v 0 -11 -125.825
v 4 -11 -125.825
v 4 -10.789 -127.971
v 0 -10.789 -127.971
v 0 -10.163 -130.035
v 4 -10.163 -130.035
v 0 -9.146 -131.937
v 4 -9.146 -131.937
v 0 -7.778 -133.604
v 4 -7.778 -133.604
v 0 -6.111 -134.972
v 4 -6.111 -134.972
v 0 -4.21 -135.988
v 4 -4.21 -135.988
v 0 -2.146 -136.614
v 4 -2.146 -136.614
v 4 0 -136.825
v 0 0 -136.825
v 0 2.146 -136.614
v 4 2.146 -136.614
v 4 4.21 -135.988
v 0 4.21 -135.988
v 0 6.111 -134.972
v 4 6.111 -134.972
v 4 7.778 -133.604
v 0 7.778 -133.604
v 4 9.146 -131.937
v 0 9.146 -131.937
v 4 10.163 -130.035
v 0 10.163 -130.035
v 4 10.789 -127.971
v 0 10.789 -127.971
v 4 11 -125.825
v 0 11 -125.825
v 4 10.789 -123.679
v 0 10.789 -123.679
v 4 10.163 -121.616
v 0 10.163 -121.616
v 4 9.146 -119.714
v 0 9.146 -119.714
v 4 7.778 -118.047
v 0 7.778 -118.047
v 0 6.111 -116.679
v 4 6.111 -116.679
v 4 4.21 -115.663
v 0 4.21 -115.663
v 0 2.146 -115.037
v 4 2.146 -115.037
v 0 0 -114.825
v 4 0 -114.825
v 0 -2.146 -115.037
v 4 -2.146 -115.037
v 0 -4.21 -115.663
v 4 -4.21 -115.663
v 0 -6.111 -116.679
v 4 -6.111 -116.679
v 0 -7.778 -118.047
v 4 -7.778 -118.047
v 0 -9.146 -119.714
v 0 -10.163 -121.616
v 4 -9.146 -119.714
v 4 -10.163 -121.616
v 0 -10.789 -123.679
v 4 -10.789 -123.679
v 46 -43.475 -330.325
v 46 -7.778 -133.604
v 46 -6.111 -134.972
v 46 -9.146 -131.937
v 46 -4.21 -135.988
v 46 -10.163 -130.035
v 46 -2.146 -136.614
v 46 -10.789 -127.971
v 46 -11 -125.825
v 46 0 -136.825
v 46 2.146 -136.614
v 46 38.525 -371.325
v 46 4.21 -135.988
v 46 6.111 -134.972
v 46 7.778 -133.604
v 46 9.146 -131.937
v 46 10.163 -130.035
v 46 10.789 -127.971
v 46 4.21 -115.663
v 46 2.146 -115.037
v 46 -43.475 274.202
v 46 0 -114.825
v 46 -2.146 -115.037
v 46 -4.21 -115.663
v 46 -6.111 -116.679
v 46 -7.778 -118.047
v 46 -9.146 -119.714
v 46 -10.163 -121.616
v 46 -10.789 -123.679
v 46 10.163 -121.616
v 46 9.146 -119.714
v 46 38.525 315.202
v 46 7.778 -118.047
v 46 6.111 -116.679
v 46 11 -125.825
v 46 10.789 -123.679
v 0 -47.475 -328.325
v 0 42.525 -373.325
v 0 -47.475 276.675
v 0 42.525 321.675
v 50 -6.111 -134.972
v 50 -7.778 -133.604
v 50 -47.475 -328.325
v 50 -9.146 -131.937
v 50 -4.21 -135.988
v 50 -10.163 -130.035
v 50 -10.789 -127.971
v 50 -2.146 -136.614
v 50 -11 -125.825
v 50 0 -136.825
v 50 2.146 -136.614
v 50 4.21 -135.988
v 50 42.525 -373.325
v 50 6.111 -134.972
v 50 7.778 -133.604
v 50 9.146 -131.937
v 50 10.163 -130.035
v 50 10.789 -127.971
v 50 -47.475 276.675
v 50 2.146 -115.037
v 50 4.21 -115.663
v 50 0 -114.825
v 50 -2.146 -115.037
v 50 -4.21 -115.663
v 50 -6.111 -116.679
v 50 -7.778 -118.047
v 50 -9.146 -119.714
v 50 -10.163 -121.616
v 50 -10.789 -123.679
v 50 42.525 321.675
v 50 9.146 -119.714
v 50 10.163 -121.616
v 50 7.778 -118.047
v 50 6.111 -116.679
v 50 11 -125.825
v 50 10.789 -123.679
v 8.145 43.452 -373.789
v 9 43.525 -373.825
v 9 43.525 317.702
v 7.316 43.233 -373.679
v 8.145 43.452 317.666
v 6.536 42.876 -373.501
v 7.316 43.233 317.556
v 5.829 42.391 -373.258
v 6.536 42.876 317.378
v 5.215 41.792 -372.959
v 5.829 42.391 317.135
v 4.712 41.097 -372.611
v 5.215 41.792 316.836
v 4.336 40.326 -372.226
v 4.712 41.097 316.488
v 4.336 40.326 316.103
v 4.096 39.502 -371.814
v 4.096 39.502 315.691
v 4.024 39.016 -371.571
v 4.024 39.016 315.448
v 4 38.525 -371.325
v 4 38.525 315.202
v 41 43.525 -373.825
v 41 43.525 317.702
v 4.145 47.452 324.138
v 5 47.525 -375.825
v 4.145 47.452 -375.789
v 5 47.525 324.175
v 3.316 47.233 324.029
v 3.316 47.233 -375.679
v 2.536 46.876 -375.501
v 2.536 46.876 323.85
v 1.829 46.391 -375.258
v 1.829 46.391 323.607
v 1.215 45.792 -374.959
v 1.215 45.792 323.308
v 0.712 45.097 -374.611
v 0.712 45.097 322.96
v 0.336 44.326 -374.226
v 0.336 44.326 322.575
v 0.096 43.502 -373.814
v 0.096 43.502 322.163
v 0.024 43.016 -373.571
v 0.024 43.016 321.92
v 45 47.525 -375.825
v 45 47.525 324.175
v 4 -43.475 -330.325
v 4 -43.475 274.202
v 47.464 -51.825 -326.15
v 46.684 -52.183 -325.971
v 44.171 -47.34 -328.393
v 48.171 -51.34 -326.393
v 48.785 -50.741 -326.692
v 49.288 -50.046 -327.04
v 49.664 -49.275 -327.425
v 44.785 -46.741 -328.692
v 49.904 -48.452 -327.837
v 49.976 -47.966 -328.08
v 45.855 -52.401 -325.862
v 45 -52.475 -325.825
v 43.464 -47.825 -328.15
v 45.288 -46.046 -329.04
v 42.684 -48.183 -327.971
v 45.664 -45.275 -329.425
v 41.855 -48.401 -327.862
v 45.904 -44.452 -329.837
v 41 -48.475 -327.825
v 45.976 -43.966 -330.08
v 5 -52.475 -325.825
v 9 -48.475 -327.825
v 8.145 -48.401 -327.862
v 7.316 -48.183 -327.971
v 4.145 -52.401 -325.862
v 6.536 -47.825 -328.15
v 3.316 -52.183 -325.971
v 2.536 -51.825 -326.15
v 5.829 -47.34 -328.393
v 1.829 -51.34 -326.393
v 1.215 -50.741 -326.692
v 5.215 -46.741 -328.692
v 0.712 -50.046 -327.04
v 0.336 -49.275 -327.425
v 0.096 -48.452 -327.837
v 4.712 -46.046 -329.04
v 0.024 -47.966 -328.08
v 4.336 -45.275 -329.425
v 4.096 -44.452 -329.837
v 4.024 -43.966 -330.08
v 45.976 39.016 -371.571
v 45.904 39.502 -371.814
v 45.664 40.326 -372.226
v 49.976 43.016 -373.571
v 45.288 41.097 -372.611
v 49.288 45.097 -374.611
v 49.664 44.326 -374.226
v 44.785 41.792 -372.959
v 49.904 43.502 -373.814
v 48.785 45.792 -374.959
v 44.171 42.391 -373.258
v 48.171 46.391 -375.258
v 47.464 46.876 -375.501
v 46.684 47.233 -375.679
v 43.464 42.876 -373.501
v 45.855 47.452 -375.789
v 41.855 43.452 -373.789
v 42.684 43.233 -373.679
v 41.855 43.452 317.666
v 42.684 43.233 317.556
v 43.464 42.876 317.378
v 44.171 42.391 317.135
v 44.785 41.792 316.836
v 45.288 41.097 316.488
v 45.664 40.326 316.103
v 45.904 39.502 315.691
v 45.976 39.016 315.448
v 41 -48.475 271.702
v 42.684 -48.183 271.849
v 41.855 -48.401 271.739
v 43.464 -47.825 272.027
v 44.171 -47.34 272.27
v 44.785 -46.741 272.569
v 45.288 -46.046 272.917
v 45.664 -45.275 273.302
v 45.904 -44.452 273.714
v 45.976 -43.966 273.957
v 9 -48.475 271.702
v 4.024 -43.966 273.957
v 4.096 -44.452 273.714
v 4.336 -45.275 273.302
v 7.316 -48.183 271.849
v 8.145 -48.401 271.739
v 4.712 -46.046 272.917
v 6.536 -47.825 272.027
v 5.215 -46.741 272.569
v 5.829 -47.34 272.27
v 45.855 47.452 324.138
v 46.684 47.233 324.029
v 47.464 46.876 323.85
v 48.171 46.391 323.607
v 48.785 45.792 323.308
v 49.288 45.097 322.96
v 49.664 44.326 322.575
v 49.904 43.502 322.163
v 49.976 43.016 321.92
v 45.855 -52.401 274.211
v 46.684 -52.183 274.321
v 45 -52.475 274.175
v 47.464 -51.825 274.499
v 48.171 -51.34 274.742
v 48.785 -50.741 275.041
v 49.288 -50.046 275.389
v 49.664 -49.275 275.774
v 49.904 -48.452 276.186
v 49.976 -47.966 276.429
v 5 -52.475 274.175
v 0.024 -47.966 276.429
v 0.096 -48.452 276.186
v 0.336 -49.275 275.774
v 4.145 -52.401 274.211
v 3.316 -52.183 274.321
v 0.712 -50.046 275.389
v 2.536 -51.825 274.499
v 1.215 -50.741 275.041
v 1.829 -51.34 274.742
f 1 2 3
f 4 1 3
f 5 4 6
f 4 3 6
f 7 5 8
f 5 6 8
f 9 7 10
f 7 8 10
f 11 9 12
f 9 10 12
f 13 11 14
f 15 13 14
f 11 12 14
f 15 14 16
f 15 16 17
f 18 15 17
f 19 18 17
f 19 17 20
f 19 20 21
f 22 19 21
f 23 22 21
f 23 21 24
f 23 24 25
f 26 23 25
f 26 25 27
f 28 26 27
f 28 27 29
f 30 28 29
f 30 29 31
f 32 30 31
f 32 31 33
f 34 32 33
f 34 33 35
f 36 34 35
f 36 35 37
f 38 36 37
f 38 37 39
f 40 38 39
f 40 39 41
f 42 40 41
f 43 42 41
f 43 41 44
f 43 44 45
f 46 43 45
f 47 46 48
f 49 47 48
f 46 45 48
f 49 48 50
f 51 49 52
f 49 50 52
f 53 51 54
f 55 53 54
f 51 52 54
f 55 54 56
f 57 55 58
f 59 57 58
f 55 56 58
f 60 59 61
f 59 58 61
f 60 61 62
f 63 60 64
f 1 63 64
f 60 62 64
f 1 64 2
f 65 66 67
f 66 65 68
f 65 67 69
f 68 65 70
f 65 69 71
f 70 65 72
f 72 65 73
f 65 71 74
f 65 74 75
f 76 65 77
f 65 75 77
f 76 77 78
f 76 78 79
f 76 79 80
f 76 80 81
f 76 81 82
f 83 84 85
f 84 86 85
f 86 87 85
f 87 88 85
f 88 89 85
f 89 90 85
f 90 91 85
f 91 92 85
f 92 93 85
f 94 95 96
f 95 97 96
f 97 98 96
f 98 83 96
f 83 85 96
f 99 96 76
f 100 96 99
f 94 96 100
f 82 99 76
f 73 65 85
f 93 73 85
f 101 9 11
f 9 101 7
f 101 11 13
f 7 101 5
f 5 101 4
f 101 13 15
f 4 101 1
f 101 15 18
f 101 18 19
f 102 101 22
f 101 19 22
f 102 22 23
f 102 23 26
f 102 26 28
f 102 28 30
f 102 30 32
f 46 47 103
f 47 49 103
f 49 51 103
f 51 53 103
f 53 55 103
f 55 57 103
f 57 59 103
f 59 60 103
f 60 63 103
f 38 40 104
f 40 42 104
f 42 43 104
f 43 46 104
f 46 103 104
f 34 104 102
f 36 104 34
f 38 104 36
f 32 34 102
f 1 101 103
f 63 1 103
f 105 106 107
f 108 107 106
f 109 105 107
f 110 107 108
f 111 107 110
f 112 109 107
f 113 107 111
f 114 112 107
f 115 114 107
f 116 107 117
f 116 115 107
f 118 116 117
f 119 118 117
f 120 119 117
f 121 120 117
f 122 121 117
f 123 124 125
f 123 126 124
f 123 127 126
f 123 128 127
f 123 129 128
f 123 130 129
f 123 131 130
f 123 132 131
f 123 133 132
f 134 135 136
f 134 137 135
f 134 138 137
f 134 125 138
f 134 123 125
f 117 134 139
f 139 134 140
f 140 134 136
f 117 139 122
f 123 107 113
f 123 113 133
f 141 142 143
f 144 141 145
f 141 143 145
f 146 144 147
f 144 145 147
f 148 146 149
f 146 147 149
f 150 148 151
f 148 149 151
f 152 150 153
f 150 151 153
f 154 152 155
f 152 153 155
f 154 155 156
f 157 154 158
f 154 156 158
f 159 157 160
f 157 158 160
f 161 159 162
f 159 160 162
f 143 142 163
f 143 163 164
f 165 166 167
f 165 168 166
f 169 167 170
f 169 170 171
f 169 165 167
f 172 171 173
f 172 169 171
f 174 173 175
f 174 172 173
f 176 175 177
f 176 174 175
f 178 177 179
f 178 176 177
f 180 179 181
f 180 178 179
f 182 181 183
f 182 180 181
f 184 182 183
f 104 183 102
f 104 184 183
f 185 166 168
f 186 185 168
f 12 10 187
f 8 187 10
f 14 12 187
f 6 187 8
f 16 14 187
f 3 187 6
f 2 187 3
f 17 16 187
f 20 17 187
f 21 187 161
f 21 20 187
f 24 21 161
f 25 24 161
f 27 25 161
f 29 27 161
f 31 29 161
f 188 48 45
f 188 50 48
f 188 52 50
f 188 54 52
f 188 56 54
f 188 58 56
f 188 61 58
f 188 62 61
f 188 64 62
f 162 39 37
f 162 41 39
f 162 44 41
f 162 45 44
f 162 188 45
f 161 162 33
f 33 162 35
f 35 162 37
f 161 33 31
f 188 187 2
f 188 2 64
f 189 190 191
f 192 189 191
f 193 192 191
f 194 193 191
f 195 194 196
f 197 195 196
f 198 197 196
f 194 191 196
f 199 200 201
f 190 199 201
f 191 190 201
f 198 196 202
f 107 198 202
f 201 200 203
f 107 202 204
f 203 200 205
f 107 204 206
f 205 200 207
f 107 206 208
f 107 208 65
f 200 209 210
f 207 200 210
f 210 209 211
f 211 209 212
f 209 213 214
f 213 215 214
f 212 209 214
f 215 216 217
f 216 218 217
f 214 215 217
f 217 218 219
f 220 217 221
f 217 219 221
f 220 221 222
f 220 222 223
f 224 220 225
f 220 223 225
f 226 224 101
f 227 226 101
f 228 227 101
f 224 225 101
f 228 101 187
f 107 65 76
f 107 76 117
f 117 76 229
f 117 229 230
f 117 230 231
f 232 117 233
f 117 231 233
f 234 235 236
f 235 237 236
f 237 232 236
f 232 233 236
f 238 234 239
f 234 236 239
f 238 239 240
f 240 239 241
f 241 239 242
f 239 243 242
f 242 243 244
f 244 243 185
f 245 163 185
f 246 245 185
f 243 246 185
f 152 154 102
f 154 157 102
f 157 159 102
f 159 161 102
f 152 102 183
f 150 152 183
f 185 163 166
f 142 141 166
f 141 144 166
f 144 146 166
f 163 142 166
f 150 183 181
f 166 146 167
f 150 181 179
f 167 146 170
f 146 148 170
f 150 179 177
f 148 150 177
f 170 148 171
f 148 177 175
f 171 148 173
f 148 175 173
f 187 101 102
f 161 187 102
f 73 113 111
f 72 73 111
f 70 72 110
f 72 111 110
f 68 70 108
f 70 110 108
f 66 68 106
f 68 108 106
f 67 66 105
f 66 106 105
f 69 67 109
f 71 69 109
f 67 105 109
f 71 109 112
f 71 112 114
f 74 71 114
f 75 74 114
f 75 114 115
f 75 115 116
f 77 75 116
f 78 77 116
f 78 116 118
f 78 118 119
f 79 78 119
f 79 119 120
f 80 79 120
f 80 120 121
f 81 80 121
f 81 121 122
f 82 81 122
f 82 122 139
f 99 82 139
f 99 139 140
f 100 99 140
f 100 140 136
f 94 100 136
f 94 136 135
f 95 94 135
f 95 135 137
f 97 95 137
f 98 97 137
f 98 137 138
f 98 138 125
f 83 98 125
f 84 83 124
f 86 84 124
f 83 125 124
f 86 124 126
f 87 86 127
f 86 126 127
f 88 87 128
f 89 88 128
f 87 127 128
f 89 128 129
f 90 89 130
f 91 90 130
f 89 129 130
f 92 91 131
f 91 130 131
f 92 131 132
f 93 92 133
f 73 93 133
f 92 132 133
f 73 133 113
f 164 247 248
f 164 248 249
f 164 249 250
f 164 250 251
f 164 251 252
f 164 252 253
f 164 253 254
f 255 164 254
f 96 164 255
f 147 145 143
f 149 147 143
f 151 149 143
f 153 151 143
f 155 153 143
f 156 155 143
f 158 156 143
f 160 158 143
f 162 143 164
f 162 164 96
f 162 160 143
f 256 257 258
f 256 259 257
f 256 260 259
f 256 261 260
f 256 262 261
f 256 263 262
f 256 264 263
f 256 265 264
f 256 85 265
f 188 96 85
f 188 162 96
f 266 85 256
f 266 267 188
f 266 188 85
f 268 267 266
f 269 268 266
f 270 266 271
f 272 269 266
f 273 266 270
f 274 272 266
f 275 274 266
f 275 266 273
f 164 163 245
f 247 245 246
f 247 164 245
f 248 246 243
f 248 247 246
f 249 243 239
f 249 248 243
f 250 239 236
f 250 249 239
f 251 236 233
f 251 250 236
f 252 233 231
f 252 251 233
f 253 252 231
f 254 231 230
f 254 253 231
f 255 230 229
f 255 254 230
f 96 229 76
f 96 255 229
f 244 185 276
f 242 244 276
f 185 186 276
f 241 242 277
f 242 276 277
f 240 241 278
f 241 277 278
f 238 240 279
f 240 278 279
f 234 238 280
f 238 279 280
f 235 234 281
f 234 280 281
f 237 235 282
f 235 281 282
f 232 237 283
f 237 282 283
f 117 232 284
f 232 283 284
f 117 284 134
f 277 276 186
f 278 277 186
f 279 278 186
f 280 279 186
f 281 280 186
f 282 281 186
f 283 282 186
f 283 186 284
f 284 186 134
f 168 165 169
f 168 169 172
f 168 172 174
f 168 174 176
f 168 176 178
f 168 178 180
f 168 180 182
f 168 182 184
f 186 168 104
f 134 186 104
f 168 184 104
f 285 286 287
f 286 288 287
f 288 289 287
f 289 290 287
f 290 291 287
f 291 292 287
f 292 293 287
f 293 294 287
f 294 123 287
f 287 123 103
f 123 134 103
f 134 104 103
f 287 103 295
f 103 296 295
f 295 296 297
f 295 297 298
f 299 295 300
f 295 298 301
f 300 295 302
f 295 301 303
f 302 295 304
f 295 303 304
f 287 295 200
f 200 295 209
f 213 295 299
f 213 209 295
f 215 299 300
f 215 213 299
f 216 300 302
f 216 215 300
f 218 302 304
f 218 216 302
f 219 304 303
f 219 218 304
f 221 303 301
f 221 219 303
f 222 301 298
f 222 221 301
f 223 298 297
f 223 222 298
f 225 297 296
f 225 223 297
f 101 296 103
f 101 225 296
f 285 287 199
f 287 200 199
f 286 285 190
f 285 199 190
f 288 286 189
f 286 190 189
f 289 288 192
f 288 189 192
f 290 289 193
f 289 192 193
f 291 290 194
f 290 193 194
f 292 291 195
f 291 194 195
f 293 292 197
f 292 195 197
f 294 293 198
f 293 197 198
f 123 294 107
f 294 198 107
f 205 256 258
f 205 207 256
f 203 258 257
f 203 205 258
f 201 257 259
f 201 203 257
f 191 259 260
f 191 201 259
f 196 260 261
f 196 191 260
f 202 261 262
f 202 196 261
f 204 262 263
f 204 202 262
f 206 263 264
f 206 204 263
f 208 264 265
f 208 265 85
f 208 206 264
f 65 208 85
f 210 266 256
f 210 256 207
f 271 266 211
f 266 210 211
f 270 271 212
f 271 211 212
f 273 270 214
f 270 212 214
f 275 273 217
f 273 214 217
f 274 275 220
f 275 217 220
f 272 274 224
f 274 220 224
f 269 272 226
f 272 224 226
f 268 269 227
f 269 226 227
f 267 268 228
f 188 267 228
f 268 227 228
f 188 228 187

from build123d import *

# Parameters (mm, degrees)
F1_DEPTH = 50
F2_T     = -4
F3_R     = 5
F4_D     = 22


with BuildPart() as f1:
    # F0 (on Right) → F1 (new body)
    with BuildSketch(Plane.YZ):
        Polygon((-52.4746724886, 274.1746123904), (-52.4746724886, -325.8253876096), (47.5253275114, -375.8253876096), (47.5253275114, 324.1746123904), align=None)
    extrude(amount=F1_DEPTH)

    # F2
    f2_openings = [f1.faces().sort_by_distance(p)[0] for p in [
        (25, -2.474672, -350.825388),
    ]]
    offset(amount=F2_T, openings=f2_openings)

    # F3
    f3_edges = [f1.edges().sort_by_distance(p)[0] for p in [
        (50, -52.474672, -25.825388),
        (50, 47.525328, -25.825388),
        (0, 47.525328, -25.825388),
        (0, -52.474672, -25.825388),
        (4, -48.474672, -28.061456),
        (4, 43.525328, -28.061456),
        (46, 43.525328, -28.061456),
        (46, -48.474672, -28.061456),
    ]]
    fillet(f3_edges, radius=F3_R)

    # F4 (through all)
    with Locations(Plane(origin=(0, 0, 0), x_dir=(0, 1, 0), z_dir=(-1, 0, 0))):
        with Locations((0, 125.8253876096)):
            Hole(F4_D / 2)


solid = f1.part
